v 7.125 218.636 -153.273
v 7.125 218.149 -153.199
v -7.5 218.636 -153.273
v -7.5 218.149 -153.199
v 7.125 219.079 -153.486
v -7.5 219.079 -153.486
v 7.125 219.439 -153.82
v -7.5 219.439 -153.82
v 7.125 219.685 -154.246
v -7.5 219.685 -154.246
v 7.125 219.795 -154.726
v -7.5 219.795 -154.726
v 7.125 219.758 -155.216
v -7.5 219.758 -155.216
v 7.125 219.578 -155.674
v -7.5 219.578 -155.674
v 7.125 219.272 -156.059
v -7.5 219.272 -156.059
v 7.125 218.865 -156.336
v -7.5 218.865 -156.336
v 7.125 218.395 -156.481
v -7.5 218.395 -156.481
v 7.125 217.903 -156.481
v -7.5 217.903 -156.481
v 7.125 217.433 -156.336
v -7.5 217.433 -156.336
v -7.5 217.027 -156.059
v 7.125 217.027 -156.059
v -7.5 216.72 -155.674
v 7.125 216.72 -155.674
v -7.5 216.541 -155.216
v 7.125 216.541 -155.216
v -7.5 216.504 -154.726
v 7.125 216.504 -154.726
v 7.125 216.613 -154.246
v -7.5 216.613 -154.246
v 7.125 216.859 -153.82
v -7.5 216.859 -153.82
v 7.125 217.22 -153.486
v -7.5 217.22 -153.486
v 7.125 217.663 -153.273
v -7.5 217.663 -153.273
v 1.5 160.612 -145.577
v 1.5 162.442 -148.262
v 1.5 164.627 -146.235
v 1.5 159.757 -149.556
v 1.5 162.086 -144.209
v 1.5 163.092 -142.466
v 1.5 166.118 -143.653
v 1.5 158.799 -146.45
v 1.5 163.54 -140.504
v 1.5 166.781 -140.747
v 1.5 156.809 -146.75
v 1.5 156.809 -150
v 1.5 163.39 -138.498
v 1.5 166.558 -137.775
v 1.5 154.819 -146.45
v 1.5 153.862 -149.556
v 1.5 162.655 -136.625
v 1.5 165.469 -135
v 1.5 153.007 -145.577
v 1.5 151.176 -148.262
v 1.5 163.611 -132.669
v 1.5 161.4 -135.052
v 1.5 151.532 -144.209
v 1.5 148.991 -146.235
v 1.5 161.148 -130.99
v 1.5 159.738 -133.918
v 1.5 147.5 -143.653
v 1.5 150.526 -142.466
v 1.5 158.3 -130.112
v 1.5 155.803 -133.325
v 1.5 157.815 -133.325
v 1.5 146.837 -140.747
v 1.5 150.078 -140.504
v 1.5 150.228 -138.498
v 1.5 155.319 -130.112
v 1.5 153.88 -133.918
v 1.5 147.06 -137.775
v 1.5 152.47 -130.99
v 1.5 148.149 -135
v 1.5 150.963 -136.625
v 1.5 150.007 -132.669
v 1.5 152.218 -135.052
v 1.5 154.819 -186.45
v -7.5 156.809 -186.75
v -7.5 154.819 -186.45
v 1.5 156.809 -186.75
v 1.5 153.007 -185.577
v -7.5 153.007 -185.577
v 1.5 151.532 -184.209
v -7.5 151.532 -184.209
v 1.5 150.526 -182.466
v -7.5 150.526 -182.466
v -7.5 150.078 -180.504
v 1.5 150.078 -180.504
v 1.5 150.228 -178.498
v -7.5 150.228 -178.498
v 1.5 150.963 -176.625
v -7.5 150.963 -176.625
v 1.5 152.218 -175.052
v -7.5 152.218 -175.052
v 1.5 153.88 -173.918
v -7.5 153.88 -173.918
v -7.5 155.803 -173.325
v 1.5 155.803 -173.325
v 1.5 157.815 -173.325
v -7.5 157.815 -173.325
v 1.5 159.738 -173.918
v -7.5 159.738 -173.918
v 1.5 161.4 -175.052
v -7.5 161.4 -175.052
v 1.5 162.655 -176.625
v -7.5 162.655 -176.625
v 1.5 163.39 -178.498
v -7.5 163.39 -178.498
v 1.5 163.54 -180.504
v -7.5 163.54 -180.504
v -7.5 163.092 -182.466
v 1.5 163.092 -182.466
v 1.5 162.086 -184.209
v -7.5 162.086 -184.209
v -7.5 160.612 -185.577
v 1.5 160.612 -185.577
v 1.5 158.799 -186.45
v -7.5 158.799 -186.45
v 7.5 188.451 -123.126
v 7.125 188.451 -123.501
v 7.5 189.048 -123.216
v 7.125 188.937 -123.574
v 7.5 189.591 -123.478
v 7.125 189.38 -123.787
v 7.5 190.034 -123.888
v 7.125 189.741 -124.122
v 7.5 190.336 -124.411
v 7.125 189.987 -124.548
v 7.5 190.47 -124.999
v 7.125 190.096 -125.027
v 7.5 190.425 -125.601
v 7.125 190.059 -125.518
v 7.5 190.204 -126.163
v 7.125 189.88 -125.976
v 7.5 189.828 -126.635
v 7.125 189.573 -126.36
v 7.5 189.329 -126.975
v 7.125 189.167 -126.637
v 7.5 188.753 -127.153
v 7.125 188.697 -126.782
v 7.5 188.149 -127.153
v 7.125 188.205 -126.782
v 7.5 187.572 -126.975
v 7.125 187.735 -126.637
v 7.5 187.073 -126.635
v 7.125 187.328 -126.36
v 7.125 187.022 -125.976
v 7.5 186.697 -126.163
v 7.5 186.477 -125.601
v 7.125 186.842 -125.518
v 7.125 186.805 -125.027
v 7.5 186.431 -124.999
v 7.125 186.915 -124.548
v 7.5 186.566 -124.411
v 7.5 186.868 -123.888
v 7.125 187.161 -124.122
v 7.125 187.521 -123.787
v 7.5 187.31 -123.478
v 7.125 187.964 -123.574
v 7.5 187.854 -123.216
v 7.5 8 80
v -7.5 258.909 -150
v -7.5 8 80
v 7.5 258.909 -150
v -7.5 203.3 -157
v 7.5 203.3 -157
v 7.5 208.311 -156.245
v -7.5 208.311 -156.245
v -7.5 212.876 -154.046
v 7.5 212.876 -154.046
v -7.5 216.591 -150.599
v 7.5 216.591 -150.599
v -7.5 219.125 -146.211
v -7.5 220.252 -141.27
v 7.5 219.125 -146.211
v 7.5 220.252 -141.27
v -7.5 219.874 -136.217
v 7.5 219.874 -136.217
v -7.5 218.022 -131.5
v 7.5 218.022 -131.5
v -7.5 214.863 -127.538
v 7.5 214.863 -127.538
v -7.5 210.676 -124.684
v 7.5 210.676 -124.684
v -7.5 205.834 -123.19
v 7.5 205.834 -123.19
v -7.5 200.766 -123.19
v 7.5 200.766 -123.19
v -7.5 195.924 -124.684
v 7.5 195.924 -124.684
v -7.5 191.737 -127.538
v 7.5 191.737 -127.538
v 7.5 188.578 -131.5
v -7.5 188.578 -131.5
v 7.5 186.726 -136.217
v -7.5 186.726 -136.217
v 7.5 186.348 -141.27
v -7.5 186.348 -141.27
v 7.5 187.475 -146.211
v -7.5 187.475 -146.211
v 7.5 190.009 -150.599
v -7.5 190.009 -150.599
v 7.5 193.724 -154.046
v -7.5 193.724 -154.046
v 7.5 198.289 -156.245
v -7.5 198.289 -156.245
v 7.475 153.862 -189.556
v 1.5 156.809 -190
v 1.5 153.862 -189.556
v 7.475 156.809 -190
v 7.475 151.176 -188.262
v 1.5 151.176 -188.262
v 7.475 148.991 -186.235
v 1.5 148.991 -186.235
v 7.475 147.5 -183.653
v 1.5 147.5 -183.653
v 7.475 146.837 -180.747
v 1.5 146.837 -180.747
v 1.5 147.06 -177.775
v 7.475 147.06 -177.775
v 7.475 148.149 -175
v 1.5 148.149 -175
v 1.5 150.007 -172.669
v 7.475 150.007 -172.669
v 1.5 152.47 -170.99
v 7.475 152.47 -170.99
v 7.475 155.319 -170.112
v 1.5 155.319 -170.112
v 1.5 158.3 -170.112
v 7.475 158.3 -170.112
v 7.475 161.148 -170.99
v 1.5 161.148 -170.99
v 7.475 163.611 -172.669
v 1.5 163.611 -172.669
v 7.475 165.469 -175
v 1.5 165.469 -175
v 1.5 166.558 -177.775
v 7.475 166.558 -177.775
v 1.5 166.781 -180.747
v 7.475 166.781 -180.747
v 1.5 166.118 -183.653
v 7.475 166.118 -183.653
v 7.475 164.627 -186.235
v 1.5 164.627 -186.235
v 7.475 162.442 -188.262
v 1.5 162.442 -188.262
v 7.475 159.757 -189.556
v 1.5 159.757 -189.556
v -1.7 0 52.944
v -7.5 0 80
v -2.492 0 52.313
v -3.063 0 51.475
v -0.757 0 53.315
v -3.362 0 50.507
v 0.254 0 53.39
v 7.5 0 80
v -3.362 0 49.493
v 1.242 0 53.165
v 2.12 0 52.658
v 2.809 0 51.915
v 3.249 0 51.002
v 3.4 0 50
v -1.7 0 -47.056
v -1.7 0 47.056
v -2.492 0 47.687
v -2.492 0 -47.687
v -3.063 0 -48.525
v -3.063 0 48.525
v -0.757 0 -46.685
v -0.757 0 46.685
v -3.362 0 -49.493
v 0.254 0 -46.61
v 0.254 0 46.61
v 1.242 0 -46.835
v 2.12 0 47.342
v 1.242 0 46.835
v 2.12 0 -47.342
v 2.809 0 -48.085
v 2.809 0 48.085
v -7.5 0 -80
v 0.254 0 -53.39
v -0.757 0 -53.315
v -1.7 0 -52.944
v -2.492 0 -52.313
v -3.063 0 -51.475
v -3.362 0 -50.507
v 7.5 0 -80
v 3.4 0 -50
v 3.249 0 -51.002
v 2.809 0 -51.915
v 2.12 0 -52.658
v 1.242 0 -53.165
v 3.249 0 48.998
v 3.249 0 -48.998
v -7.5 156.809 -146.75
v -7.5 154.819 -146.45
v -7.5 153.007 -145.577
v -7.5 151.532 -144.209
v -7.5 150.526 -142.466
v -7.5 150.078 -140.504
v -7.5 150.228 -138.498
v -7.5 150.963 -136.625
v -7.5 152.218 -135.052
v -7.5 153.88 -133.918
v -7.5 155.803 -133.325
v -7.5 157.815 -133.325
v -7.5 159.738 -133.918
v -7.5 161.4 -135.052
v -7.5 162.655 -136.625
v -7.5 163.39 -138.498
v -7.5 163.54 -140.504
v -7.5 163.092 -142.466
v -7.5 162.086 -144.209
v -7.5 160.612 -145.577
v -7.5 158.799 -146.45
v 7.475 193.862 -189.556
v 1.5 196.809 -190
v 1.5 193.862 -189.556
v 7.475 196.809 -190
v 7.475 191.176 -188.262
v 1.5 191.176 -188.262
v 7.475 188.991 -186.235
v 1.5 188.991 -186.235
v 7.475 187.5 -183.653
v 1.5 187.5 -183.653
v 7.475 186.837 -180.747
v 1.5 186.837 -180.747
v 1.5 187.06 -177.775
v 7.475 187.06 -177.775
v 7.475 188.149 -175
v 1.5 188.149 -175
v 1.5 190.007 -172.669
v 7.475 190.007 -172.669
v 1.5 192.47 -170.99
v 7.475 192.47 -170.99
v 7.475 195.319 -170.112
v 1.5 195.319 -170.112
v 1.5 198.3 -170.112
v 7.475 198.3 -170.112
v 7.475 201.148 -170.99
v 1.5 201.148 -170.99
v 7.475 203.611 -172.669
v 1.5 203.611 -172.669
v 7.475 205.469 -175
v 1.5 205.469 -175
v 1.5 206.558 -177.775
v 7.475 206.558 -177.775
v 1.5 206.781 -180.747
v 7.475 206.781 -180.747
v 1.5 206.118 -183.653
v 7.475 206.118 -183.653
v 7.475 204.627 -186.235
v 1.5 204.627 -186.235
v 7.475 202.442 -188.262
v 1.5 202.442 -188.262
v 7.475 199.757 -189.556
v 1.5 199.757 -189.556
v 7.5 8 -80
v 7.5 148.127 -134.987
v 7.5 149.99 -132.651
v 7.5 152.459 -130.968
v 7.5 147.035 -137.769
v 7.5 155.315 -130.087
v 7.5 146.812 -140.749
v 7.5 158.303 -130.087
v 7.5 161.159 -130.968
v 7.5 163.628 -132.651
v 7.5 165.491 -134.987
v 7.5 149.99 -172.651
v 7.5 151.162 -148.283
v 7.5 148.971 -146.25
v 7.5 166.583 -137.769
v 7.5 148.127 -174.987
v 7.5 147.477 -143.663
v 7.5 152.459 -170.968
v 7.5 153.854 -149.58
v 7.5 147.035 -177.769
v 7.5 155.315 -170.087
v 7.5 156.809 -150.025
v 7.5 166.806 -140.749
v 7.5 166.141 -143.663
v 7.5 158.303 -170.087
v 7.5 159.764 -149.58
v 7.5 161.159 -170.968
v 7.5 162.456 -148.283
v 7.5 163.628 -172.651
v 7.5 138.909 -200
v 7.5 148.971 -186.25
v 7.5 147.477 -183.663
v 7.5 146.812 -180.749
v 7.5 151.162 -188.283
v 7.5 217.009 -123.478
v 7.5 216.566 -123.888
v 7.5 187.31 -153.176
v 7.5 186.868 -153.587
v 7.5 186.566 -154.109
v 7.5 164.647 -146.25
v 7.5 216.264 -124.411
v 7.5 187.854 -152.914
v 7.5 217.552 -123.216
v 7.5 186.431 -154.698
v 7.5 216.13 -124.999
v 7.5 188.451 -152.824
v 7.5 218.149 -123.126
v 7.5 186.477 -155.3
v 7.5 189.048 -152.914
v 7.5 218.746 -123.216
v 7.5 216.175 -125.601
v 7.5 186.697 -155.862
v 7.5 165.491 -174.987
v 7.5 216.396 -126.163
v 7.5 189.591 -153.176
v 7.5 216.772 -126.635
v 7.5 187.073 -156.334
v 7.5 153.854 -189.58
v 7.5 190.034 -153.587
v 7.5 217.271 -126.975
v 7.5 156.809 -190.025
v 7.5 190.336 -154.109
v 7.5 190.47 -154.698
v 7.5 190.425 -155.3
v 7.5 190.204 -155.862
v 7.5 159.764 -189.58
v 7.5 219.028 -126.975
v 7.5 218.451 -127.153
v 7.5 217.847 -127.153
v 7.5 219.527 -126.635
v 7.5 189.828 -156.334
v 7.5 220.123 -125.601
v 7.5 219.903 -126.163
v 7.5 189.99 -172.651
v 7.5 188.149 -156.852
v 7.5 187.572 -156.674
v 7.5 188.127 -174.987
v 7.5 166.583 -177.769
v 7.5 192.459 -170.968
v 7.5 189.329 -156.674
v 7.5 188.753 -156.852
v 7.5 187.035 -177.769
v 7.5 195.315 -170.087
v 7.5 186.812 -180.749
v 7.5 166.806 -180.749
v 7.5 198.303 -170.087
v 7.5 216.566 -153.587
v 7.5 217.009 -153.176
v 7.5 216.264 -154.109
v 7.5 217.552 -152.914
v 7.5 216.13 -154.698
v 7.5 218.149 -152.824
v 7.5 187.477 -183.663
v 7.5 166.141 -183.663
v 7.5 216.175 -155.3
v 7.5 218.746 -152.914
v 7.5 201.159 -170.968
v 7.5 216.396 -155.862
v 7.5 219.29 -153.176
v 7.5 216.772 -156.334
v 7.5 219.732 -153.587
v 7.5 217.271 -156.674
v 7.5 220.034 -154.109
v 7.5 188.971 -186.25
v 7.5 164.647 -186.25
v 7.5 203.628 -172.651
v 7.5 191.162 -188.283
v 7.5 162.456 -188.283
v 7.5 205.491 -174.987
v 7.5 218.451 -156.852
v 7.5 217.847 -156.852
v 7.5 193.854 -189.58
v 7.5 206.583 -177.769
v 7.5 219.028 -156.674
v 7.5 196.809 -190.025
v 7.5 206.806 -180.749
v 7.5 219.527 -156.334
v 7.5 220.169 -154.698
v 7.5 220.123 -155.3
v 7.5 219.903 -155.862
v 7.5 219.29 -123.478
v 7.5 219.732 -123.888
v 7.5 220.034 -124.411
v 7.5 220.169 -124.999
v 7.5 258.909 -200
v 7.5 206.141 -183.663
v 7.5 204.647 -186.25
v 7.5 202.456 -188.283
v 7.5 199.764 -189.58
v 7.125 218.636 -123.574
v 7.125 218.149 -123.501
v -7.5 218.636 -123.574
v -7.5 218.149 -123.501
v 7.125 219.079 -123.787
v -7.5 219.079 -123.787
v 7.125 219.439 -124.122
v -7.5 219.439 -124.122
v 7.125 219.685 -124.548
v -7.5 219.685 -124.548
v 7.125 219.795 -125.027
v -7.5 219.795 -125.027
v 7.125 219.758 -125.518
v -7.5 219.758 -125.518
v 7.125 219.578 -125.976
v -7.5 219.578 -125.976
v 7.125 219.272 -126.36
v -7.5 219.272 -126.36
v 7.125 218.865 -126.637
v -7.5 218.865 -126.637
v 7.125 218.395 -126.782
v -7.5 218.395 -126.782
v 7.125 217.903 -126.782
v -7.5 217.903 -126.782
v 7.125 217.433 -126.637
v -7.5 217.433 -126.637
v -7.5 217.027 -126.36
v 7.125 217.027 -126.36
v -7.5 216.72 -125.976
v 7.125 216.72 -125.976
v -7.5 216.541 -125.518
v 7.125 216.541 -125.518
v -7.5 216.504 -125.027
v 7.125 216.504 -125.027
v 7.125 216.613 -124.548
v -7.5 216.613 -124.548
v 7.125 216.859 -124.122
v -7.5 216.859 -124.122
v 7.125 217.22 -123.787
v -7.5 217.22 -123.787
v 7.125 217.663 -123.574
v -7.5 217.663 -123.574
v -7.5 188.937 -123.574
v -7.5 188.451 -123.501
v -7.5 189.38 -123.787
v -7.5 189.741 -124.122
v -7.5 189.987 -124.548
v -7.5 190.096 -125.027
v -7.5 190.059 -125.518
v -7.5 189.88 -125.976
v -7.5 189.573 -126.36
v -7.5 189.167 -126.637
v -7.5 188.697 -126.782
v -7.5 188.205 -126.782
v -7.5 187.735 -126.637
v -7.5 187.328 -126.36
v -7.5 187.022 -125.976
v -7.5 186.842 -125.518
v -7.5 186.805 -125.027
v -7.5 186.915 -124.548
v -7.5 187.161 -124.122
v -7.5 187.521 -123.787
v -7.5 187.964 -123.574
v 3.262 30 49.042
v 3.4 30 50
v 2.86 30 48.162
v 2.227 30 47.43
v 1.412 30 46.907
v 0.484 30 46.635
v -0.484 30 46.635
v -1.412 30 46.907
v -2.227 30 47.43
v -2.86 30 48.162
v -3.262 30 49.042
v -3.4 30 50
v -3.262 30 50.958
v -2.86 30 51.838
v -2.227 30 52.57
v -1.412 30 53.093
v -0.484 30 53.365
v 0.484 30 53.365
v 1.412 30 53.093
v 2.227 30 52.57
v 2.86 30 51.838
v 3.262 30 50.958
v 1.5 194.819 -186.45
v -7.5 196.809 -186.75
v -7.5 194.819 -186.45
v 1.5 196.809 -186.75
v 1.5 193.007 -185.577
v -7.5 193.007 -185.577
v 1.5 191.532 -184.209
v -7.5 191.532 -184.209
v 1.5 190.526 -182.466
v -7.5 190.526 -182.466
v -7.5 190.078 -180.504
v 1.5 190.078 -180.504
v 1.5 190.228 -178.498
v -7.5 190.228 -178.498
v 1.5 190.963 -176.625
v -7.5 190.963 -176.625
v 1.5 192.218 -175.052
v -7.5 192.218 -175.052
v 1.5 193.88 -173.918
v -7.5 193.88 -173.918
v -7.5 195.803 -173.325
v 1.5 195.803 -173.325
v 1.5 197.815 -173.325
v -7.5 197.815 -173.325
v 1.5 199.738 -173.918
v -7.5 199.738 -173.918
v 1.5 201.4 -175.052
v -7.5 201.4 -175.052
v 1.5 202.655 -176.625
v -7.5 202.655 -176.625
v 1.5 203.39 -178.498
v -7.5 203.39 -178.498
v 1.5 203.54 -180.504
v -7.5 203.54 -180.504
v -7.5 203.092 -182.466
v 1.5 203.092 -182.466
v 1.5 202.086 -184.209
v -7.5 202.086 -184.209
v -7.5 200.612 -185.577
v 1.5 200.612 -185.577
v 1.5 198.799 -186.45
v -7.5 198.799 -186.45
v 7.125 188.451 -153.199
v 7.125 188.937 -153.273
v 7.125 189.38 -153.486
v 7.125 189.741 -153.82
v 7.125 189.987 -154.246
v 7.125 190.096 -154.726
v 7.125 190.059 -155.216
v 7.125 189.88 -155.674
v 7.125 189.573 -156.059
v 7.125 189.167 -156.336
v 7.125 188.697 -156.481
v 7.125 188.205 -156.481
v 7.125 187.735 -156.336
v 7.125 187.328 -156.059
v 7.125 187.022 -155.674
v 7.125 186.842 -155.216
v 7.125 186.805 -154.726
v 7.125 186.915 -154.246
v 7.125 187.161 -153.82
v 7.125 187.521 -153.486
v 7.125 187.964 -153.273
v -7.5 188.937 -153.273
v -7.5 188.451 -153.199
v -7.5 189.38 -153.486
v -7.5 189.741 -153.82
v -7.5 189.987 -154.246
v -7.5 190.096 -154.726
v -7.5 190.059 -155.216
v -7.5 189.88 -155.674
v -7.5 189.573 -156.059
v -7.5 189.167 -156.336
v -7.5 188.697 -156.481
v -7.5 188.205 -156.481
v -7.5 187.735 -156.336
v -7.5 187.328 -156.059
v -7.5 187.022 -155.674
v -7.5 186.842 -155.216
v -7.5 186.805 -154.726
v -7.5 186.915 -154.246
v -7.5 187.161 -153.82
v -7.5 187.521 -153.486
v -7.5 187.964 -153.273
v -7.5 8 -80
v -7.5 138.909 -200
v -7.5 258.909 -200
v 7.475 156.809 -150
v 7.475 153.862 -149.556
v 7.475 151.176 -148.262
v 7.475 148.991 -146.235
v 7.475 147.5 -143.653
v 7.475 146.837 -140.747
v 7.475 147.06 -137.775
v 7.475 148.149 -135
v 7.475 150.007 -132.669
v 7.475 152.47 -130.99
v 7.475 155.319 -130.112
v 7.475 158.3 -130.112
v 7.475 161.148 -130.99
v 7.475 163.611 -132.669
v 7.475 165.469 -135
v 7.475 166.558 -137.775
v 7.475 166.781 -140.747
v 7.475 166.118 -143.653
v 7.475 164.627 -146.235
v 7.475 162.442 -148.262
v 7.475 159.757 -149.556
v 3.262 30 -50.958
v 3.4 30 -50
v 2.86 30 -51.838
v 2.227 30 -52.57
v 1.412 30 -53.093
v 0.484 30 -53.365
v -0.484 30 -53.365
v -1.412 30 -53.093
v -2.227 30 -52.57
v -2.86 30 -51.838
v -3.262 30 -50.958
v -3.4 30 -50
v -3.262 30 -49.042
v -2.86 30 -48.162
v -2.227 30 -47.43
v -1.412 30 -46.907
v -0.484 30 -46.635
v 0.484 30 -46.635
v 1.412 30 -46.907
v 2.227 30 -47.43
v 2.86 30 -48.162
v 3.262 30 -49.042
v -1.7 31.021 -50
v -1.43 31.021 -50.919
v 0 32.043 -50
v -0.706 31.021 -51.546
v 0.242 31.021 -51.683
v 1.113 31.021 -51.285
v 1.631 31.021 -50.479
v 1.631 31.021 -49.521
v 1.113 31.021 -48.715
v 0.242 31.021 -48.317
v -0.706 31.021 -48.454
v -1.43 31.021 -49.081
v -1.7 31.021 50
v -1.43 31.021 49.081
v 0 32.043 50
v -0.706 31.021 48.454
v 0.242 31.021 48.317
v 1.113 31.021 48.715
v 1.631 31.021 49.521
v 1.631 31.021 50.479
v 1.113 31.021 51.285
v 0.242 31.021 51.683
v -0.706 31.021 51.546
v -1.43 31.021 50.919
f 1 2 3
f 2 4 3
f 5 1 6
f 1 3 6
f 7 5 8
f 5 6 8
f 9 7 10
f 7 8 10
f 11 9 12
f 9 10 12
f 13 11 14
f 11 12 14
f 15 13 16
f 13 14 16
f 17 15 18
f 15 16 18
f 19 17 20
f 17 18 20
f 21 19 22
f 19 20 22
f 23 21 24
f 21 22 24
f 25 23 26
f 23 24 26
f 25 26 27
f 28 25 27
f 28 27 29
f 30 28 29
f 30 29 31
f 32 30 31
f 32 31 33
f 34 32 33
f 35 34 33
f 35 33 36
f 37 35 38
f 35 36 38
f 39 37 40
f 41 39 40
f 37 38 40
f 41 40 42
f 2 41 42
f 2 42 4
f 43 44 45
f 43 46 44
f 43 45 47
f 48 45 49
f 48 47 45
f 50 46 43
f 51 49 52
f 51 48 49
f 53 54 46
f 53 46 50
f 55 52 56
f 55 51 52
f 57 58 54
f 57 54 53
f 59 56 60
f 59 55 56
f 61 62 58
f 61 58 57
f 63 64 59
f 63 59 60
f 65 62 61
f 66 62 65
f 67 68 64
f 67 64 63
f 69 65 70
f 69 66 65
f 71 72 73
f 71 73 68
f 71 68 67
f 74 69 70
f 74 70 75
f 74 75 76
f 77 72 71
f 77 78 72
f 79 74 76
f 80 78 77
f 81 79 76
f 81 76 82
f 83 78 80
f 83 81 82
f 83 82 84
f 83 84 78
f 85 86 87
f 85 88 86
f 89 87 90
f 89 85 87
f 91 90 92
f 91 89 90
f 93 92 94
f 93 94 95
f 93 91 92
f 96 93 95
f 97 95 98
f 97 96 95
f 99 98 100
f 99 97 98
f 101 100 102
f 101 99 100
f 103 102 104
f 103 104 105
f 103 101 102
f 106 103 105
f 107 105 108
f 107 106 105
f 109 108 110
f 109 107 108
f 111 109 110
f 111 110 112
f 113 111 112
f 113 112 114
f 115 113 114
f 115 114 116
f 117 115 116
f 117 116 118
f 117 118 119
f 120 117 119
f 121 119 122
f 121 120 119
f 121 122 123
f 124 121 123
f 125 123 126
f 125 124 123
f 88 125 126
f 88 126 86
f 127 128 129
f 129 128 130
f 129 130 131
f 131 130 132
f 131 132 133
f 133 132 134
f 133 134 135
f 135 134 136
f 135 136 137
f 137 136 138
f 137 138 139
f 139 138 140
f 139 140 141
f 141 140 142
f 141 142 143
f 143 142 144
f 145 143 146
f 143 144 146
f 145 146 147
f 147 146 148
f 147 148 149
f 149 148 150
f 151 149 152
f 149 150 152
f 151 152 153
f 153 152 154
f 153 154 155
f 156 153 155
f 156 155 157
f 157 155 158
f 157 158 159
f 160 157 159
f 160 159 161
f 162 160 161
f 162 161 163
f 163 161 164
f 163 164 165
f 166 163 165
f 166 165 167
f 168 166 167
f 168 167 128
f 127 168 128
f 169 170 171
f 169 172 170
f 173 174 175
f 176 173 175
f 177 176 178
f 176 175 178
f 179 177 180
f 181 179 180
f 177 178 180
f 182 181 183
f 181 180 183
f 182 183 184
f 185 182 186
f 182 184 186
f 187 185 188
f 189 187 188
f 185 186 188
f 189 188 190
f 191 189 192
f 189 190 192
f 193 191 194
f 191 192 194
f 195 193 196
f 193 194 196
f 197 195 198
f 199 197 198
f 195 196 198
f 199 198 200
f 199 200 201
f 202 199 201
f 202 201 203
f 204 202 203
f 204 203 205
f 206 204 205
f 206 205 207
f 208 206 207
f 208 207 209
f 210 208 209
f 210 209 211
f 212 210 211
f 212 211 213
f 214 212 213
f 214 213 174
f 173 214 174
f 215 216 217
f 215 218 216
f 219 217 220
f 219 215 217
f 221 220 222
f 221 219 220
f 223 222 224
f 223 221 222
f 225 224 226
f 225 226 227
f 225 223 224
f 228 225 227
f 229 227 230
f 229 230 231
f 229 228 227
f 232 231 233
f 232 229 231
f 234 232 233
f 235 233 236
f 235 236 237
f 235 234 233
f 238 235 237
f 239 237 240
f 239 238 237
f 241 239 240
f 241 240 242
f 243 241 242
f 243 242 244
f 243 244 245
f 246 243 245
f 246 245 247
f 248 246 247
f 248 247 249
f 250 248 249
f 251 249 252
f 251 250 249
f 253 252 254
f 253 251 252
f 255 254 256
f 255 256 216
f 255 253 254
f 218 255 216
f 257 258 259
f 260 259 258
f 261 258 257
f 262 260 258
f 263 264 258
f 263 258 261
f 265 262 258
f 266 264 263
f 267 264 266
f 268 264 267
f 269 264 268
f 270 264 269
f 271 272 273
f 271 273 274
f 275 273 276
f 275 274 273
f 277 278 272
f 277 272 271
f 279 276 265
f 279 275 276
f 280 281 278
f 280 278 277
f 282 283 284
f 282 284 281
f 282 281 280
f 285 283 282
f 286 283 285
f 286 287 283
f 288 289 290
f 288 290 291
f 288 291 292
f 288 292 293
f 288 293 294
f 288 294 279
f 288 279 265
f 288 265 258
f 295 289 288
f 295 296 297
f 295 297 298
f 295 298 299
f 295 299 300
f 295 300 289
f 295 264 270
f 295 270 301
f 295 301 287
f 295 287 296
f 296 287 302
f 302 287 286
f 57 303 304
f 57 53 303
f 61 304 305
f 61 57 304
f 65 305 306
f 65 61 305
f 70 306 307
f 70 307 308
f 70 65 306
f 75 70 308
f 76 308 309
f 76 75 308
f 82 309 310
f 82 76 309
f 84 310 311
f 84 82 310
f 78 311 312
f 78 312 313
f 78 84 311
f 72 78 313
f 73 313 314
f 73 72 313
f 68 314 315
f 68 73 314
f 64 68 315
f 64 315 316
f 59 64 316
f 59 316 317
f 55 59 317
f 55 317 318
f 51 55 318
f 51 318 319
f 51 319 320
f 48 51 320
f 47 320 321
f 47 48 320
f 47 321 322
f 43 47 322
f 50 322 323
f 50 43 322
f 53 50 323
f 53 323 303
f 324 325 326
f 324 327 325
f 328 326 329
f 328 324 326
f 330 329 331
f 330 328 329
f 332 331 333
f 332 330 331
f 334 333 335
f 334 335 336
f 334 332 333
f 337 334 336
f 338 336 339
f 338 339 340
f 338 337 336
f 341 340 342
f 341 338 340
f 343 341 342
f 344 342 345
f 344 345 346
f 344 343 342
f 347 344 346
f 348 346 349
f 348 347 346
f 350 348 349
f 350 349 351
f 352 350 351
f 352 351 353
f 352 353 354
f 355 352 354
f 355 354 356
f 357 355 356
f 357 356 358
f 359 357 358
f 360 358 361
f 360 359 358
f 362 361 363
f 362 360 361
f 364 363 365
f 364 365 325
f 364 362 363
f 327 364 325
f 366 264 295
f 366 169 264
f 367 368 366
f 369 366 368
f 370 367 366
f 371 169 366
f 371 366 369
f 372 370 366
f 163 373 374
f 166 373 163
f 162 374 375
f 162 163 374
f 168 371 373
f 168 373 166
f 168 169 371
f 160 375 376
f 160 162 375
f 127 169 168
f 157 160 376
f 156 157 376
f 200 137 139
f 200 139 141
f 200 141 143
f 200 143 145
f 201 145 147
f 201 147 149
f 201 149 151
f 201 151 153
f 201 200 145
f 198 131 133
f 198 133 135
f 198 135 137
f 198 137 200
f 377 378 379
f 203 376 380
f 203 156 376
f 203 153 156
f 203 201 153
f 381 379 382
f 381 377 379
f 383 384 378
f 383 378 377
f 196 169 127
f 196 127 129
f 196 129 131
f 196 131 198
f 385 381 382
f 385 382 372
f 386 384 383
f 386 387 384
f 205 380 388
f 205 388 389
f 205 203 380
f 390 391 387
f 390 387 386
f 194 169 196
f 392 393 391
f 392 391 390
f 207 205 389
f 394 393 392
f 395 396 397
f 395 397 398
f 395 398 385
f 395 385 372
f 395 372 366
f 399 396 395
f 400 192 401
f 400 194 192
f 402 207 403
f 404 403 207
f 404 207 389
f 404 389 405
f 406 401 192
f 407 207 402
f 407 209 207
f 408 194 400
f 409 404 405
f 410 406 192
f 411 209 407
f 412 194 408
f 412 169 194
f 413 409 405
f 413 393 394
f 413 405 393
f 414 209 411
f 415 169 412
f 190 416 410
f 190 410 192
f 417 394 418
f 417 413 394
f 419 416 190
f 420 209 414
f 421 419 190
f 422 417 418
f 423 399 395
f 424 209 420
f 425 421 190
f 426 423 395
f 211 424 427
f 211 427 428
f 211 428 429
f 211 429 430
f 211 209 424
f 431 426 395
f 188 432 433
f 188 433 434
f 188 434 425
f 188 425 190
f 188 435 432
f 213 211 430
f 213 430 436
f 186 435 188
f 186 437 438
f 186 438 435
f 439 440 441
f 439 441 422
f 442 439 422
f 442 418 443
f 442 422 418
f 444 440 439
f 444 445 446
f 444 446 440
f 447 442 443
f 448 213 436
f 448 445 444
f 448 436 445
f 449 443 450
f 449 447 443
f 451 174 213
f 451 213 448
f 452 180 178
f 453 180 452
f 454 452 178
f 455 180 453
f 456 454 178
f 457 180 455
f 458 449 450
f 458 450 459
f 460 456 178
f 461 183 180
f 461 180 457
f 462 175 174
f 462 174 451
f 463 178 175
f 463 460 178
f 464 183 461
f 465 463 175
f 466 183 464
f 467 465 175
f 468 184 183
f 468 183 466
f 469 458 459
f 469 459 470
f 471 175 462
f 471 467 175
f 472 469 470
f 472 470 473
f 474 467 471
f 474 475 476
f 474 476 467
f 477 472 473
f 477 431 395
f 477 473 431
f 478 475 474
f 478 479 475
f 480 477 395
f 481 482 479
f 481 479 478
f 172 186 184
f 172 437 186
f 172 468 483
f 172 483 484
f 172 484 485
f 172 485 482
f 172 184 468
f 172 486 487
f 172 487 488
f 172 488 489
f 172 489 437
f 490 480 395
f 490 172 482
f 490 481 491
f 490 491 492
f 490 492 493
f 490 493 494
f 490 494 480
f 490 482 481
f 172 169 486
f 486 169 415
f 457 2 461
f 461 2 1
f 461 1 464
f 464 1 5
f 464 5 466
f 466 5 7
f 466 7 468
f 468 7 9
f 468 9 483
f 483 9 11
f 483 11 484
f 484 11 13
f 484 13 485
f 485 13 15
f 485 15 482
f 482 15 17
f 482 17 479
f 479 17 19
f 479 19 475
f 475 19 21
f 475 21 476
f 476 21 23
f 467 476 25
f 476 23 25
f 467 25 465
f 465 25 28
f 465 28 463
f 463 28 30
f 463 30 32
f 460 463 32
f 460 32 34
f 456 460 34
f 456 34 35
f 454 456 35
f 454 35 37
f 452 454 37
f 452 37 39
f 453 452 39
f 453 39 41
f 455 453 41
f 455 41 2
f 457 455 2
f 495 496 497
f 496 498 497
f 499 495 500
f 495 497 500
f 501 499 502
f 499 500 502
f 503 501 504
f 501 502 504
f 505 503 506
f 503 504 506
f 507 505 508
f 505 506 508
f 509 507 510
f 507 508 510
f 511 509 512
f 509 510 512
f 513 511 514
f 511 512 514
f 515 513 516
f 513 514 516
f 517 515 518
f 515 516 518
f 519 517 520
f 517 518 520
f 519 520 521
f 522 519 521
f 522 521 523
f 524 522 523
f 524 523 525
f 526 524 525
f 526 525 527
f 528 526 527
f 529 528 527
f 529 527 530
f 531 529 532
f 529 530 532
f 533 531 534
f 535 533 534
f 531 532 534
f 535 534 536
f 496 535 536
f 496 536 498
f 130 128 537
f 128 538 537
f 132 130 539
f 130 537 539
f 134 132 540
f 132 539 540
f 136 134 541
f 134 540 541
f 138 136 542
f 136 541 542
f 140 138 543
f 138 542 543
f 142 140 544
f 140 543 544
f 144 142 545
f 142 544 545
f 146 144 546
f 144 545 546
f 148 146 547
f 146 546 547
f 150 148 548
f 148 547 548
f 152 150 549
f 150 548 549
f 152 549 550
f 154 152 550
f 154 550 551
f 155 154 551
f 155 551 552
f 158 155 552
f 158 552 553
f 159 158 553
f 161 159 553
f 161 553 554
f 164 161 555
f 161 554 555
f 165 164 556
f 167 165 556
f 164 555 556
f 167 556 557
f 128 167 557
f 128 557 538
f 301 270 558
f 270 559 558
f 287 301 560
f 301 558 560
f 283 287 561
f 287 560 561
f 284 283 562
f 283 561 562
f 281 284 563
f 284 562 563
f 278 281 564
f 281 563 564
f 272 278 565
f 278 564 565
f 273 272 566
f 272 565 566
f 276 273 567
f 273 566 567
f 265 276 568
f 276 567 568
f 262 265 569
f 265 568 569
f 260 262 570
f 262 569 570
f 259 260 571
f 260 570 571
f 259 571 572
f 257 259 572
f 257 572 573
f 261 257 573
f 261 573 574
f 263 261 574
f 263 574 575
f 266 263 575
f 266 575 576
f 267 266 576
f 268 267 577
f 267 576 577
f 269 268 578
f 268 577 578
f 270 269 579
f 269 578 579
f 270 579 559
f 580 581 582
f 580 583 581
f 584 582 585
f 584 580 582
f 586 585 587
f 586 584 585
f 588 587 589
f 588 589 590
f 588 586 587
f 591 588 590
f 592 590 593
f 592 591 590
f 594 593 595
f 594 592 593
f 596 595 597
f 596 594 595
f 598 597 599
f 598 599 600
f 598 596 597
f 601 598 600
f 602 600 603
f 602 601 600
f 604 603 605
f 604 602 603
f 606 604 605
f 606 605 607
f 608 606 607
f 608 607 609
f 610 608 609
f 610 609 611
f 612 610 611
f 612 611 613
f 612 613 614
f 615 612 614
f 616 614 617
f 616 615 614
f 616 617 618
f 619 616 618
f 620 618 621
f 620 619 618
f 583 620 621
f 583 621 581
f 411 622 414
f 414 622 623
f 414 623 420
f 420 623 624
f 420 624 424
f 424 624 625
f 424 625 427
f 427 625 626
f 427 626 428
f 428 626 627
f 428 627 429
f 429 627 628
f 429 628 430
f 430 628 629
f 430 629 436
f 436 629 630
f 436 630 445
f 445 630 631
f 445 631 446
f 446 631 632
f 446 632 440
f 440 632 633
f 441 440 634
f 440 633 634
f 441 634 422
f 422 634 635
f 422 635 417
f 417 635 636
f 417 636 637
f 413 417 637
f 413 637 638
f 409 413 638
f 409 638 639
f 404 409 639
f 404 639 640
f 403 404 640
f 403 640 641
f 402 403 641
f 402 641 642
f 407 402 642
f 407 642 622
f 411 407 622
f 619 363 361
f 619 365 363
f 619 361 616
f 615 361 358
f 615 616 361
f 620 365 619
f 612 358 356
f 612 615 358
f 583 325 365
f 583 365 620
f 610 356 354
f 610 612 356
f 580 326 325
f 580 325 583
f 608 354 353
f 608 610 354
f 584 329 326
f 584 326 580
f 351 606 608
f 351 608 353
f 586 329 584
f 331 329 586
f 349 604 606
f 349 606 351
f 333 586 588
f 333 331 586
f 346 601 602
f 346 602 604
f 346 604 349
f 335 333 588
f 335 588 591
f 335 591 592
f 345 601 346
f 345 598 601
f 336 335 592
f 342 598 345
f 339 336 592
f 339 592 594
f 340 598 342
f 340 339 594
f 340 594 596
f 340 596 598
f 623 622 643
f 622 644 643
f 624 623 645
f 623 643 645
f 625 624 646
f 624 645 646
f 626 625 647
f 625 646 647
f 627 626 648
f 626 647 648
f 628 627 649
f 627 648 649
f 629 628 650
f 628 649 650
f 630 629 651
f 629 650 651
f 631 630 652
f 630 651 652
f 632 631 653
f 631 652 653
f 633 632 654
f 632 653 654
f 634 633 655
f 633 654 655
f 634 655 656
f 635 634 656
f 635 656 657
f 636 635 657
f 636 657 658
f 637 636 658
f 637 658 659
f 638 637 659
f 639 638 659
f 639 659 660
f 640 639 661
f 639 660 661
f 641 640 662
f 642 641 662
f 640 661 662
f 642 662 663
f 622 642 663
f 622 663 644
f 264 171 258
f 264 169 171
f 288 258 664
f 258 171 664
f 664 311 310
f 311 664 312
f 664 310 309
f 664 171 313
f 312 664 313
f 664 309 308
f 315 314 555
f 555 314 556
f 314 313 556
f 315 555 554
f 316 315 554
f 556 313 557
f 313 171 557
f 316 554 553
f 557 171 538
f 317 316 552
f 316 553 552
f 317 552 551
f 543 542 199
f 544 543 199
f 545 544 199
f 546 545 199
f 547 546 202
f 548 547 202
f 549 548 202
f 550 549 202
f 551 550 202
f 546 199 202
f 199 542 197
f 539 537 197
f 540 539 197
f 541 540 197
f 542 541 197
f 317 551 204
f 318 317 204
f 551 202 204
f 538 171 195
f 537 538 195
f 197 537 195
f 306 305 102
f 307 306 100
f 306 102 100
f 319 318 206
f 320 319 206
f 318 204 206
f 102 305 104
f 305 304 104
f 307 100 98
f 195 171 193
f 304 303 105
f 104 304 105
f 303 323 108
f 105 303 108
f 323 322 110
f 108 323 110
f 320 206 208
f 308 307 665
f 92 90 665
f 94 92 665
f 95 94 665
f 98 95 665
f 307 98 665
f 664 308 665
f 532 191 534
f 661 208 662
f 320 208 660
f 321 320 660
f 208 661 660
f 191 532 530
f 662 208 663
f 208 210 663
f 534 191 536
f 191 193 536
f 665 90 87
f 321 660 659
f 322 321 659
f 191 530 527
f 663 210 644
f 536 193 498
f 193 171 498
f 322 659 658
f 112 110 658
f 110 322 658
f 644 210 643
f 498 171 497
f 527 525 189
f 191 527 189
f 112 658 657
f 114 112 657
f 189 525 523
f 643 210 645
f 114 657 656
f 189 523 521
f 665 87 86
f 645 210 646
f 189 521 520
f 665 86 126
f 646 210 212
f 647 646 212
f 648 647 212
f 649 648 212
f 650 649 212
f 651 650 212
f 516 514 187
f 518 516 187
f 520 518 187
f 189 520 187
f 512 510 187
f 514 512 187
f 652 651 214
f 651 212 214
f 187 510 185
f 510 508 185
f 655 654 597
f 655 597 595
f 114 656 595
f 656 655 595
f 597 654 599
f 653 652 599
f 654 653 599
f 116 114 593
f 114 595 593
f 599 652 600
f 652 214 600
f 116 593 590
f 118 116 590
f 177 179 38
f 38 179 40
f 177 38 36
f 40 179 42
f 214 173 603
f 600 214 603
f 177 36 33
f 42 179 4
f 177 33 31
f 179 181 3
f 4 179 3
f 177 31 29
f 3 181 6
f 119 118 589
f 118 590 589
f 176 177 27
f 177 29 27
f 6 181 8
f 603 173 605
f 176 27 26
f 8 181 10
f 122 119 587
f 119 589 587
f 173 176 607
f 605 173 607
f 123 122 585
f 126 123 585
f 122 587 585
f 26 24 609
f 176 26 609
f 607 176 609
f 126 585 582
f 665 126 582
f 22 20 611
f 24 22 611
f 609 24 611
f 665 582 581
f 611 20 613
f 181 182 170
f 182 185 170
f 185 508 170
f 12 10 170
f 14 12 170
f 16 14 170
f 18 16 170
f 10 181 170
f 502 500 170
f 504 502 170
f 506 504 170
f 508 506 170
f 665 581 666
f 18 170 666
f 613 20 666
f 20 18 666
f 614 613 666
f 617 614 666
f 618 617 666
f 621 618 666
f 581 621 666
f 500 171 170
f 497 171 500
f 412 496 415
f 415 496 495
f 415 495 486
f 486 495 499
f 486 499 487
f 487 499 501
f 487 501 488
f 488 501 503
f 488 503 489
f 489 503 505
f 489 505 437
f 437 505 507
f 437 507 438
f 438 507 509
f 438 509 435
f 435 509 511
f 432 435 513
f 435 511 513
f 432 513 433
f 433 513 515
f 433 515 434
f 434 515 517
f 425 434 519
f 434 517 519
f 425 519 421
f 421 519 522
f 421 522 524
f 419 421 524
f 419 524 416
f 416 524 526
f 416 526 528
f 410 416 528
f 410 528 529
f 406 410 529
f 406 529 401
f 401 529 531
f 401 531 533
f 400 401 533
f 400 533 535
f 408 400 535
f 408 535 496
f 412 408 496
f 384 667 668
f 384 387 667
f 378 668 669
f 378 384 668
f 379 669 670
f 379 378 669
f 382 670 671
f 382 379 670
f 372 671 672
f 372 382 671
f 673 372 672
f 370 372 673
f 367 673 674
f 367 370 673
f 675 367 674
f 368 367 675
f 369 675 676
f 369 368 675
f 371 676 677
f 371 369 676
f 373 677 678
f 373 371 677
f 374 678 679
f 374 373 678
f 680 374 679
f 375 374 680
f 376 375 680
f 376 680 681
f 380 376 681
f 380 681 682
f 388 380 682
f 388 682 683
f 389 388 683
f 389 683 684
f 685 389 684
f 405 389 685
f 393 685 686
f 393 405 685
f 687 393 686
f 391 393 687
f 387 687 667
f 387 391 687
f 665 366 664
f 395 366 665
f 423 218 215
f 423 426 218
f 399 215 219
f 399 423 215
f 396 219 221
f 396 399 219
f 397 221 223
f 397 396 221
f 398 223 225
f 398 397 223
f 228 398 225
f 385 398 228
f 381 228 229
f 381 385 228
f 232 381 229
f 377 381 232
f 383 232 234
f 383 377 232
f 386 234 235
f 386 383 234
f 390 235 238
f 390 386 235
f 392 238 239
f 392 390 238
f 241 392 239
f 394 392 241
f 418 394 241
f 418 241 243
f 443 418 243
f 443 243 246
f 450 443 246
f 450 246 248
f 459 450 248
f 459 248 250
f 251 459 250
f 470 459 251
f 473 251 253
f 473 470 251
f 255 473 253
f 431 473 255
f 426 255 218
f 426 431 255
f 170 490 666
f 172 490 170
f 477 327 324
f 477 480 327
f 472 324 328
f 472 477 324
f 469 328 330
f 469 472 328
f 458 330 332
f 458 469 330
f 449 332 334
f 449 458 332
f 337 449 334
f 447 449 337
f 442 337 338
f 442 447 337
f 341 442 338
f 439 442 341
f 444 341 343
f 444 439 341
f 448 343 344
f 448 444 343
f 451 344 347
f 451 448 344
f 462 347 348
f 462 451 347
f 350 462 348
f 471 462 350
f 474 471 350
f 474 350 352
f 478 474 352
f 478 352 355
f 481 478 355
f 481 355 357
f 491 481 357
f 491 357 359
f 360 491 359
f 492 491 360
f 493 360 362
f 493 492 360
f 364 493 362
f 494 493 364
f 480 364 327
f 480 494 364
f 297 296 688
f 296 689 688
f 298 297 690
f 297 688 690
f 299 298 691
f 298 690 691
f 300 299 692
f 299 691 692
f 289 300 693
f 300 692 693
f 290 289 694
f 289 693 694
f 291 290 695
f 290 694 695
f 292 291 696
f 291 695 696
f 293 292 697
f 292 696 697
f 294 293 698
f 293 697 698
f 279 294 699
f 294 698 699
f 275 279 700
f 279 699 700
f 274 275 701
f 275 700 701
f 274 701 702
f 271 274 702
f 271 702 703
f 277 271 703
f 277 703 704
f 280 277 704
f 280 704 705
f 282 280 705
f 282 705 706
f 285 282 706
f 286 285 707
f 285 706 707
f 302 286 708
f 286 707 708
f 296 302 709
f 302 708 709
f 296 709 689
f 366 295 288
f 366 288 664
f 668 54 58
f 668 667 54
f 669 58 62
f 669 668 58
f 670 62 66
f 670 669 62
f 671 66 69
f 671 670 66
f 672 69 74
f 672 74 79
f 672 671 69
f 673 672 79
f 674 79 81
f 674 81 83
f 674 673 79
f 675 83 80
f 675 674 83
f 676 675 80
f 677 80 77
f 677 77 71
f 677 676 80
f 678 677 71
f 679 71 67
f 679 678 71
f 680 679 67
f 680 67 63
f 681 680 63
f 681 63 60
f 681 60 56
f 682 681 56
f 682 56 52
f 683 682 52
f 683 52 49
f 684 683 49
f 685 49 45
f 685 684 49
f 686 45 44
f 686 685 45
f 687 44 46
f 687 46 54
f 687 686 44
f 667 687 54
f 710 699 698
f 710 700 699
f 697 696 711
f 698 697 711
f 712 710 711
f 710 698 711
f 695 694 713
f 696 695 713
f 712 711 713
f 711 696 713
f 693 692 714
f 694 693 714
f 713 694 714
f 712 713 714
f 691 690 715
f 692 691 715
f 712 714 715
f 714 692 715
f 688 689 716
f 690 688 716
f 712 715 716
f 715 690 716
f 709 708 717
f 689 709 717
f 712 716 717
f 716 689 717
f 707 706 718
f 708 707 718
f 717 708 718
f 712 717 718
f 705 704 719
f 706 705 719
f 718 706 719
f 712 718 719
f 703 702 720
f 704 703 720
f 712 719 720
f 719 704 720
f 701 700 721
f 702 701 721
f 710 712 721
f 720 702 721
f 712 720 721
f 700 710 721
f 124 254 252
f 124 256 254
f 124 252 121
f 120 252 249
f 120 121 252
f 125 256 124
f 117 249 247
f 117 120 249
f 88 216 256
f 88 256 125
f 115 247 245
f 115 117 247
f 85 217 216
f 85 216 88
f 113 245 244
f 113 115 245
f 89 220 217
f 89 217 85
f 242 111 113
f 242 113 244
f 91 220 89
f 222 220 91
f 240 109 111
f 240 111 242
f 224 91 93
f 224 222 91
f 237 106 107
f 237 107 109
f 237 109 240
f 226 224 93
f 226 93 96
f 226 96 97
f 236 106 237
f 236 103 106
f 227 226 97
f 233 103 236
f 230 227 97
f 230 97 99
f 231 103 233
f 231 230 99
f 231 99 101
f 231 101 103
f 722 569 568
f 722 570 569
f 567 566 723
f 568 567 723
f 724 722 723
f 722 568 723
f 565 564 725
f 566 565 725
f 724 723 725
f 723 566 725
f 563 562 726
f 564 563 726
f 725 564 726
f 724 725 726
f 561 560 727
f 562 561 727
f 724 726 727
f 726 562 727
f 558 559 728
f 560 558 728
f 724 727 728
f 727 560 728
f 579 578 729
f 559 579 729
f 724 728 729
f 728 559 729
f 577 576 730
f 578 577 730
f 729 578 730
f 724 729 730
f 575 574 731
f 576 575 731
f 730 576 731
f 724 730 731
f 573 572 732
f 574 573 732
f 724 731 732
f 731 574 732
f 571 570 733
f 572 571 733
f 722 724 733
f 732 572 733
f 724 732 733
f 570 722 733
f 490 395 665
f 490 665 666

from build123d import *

# Parameters (mm, degrees)
EXTRUDE_703_DEPTH          = 7.5
HOLE_WIZARD_M8_D           = 6.8
HOLE_WIZARD_M8_DEPTH       = 30
HOLE_WIZARD_M8_TIP         = 2.042926105
HOLE_WIZARD_M12_AT_2_COUNT = 2
HOLE_WIZARD_M12_AT_2_PITCH = 40
HOLE_WIZARD_M12_AT_3_COUNT = 2
HOLE_WIZARD_M12_AT_3_PITCH = 56.568542495
SKETCH_10_R                = 17
CUT_EXTRUDE_1_DEPTH        = 328.504072273
FK10_M4_D                  = 3.3
FK10_M4_CSINK_D            = 4.05
FK10_M4_CSINK_ANGLE        = 90


with BuildPart() as part:
    # Эскиз1 → Extrude 703 (new, symmetric)
    with BuildSketch(Plane(origin=(0, 0, 0), x_dir=(0, 0, -1), z_dir=(1, 0, 0))):
        Polygon((-80, 0), (0, 0), (80, 0), (80, 8), (200, 138.909090909), (200, 258.909090909), (150, 258.909090909), (-80, 8), align=None)
    extrude(amount=EXTRUDE_703_DEPTH, both=True)

    # Крепление к плите M8
    with Locations(Plane(origin=(0, 0, 0), x_dir=(-1, 0, 0), z_dir=(0, -1, 0))):
        with Locations((0, -50), (0, 50)):
            Hole(HOLE_WIZARD_M8_D / 2, depth=HOLE_WIZARD_M8_DEPTH)
            with Locations((0, 0, -(HOLE_WIZARD_M8_DEPTH + HOLE_WIZARD_M8_TIP / 2))):  # 118° drill point
                Cone(0, HOLE_WIZARD_M8_D / 2, HOLE_WIZARD_M8_TIP, mode=Mode.SUBTRACT)

    # Эскиз9 → К профилю M12 (revolve, cut)
    with BuildSketch(Plane(origin=(7.5, 196.809090909, -180), x_dir=(0, 0, -1), z_dir=(0, 1, 0))):
        Polygon((0, 0), (0, 15), (6.75, 15), (6.75, 6), (10, 6), (10, 0.025), (10.025, 0), align=None)
    hole_wizard_m12 = revolve(axis=Axis((13.85, 196.809090909, -180), (-1, 0, 0)), mode=Mode.SUBTRACT)

    # К профилю M12 at 2: К профилю M12 ×2
    with Locations(*[(0, -i * HOLE_WIZARD_M12_AT_2_PITCH, 0) for i in range(1, HOLE_WIZARD_M12_AT_2_COUNT)]):
        add(hole_wizard_m12, mode=Mode.SUBTRACT)

    # К профилю M12 at 3: К профилю M12 ×2
    with Locations(*[Vector(0, -0.7071067811865474, 0.7071067811865478) * (i * HOLE_WIZARD_M12_AT_3_PITCH) for i in range(1, HOLE_WIZARD_M12_AT_3_COUNT)]):
        add(hole_wizard_m12, mode=Mode.SUBTRACT)

    # Эскиз10 → Вырез-Вытянуть1 (cut, through all)
    with BuildSketch(Plane(origin=(7.5, 0, 0), x_dir=(0, 0, -1), z_dir=(1, 0, 0))):
        with Locations((140, 203.3)):
            Circle(SKETCH_10_R)
    extrude(amount=-CUT_EXTRUDE_1_DEPTH, mode=Mode.SUBTRACT)

    # FK10 - M4 (through all)
    with Locations(Plane(origin=(7.5, 0, 0), x_dir=(0, 0, -1), z_dir=(1, 0, 0))):
        with Locations((154.849242405, 218.149242405), (154.849242405, 188.450757595), (125.150757595, 188.450757595), (125.150757595, 218.149242405)):
            CounterSinkHole(FK10_M4_D / 2, FK10_M4_CSINK_D / 2, counter_sink_angle=FK10_M4_CSINK_ANGLE)


solid = part.part
